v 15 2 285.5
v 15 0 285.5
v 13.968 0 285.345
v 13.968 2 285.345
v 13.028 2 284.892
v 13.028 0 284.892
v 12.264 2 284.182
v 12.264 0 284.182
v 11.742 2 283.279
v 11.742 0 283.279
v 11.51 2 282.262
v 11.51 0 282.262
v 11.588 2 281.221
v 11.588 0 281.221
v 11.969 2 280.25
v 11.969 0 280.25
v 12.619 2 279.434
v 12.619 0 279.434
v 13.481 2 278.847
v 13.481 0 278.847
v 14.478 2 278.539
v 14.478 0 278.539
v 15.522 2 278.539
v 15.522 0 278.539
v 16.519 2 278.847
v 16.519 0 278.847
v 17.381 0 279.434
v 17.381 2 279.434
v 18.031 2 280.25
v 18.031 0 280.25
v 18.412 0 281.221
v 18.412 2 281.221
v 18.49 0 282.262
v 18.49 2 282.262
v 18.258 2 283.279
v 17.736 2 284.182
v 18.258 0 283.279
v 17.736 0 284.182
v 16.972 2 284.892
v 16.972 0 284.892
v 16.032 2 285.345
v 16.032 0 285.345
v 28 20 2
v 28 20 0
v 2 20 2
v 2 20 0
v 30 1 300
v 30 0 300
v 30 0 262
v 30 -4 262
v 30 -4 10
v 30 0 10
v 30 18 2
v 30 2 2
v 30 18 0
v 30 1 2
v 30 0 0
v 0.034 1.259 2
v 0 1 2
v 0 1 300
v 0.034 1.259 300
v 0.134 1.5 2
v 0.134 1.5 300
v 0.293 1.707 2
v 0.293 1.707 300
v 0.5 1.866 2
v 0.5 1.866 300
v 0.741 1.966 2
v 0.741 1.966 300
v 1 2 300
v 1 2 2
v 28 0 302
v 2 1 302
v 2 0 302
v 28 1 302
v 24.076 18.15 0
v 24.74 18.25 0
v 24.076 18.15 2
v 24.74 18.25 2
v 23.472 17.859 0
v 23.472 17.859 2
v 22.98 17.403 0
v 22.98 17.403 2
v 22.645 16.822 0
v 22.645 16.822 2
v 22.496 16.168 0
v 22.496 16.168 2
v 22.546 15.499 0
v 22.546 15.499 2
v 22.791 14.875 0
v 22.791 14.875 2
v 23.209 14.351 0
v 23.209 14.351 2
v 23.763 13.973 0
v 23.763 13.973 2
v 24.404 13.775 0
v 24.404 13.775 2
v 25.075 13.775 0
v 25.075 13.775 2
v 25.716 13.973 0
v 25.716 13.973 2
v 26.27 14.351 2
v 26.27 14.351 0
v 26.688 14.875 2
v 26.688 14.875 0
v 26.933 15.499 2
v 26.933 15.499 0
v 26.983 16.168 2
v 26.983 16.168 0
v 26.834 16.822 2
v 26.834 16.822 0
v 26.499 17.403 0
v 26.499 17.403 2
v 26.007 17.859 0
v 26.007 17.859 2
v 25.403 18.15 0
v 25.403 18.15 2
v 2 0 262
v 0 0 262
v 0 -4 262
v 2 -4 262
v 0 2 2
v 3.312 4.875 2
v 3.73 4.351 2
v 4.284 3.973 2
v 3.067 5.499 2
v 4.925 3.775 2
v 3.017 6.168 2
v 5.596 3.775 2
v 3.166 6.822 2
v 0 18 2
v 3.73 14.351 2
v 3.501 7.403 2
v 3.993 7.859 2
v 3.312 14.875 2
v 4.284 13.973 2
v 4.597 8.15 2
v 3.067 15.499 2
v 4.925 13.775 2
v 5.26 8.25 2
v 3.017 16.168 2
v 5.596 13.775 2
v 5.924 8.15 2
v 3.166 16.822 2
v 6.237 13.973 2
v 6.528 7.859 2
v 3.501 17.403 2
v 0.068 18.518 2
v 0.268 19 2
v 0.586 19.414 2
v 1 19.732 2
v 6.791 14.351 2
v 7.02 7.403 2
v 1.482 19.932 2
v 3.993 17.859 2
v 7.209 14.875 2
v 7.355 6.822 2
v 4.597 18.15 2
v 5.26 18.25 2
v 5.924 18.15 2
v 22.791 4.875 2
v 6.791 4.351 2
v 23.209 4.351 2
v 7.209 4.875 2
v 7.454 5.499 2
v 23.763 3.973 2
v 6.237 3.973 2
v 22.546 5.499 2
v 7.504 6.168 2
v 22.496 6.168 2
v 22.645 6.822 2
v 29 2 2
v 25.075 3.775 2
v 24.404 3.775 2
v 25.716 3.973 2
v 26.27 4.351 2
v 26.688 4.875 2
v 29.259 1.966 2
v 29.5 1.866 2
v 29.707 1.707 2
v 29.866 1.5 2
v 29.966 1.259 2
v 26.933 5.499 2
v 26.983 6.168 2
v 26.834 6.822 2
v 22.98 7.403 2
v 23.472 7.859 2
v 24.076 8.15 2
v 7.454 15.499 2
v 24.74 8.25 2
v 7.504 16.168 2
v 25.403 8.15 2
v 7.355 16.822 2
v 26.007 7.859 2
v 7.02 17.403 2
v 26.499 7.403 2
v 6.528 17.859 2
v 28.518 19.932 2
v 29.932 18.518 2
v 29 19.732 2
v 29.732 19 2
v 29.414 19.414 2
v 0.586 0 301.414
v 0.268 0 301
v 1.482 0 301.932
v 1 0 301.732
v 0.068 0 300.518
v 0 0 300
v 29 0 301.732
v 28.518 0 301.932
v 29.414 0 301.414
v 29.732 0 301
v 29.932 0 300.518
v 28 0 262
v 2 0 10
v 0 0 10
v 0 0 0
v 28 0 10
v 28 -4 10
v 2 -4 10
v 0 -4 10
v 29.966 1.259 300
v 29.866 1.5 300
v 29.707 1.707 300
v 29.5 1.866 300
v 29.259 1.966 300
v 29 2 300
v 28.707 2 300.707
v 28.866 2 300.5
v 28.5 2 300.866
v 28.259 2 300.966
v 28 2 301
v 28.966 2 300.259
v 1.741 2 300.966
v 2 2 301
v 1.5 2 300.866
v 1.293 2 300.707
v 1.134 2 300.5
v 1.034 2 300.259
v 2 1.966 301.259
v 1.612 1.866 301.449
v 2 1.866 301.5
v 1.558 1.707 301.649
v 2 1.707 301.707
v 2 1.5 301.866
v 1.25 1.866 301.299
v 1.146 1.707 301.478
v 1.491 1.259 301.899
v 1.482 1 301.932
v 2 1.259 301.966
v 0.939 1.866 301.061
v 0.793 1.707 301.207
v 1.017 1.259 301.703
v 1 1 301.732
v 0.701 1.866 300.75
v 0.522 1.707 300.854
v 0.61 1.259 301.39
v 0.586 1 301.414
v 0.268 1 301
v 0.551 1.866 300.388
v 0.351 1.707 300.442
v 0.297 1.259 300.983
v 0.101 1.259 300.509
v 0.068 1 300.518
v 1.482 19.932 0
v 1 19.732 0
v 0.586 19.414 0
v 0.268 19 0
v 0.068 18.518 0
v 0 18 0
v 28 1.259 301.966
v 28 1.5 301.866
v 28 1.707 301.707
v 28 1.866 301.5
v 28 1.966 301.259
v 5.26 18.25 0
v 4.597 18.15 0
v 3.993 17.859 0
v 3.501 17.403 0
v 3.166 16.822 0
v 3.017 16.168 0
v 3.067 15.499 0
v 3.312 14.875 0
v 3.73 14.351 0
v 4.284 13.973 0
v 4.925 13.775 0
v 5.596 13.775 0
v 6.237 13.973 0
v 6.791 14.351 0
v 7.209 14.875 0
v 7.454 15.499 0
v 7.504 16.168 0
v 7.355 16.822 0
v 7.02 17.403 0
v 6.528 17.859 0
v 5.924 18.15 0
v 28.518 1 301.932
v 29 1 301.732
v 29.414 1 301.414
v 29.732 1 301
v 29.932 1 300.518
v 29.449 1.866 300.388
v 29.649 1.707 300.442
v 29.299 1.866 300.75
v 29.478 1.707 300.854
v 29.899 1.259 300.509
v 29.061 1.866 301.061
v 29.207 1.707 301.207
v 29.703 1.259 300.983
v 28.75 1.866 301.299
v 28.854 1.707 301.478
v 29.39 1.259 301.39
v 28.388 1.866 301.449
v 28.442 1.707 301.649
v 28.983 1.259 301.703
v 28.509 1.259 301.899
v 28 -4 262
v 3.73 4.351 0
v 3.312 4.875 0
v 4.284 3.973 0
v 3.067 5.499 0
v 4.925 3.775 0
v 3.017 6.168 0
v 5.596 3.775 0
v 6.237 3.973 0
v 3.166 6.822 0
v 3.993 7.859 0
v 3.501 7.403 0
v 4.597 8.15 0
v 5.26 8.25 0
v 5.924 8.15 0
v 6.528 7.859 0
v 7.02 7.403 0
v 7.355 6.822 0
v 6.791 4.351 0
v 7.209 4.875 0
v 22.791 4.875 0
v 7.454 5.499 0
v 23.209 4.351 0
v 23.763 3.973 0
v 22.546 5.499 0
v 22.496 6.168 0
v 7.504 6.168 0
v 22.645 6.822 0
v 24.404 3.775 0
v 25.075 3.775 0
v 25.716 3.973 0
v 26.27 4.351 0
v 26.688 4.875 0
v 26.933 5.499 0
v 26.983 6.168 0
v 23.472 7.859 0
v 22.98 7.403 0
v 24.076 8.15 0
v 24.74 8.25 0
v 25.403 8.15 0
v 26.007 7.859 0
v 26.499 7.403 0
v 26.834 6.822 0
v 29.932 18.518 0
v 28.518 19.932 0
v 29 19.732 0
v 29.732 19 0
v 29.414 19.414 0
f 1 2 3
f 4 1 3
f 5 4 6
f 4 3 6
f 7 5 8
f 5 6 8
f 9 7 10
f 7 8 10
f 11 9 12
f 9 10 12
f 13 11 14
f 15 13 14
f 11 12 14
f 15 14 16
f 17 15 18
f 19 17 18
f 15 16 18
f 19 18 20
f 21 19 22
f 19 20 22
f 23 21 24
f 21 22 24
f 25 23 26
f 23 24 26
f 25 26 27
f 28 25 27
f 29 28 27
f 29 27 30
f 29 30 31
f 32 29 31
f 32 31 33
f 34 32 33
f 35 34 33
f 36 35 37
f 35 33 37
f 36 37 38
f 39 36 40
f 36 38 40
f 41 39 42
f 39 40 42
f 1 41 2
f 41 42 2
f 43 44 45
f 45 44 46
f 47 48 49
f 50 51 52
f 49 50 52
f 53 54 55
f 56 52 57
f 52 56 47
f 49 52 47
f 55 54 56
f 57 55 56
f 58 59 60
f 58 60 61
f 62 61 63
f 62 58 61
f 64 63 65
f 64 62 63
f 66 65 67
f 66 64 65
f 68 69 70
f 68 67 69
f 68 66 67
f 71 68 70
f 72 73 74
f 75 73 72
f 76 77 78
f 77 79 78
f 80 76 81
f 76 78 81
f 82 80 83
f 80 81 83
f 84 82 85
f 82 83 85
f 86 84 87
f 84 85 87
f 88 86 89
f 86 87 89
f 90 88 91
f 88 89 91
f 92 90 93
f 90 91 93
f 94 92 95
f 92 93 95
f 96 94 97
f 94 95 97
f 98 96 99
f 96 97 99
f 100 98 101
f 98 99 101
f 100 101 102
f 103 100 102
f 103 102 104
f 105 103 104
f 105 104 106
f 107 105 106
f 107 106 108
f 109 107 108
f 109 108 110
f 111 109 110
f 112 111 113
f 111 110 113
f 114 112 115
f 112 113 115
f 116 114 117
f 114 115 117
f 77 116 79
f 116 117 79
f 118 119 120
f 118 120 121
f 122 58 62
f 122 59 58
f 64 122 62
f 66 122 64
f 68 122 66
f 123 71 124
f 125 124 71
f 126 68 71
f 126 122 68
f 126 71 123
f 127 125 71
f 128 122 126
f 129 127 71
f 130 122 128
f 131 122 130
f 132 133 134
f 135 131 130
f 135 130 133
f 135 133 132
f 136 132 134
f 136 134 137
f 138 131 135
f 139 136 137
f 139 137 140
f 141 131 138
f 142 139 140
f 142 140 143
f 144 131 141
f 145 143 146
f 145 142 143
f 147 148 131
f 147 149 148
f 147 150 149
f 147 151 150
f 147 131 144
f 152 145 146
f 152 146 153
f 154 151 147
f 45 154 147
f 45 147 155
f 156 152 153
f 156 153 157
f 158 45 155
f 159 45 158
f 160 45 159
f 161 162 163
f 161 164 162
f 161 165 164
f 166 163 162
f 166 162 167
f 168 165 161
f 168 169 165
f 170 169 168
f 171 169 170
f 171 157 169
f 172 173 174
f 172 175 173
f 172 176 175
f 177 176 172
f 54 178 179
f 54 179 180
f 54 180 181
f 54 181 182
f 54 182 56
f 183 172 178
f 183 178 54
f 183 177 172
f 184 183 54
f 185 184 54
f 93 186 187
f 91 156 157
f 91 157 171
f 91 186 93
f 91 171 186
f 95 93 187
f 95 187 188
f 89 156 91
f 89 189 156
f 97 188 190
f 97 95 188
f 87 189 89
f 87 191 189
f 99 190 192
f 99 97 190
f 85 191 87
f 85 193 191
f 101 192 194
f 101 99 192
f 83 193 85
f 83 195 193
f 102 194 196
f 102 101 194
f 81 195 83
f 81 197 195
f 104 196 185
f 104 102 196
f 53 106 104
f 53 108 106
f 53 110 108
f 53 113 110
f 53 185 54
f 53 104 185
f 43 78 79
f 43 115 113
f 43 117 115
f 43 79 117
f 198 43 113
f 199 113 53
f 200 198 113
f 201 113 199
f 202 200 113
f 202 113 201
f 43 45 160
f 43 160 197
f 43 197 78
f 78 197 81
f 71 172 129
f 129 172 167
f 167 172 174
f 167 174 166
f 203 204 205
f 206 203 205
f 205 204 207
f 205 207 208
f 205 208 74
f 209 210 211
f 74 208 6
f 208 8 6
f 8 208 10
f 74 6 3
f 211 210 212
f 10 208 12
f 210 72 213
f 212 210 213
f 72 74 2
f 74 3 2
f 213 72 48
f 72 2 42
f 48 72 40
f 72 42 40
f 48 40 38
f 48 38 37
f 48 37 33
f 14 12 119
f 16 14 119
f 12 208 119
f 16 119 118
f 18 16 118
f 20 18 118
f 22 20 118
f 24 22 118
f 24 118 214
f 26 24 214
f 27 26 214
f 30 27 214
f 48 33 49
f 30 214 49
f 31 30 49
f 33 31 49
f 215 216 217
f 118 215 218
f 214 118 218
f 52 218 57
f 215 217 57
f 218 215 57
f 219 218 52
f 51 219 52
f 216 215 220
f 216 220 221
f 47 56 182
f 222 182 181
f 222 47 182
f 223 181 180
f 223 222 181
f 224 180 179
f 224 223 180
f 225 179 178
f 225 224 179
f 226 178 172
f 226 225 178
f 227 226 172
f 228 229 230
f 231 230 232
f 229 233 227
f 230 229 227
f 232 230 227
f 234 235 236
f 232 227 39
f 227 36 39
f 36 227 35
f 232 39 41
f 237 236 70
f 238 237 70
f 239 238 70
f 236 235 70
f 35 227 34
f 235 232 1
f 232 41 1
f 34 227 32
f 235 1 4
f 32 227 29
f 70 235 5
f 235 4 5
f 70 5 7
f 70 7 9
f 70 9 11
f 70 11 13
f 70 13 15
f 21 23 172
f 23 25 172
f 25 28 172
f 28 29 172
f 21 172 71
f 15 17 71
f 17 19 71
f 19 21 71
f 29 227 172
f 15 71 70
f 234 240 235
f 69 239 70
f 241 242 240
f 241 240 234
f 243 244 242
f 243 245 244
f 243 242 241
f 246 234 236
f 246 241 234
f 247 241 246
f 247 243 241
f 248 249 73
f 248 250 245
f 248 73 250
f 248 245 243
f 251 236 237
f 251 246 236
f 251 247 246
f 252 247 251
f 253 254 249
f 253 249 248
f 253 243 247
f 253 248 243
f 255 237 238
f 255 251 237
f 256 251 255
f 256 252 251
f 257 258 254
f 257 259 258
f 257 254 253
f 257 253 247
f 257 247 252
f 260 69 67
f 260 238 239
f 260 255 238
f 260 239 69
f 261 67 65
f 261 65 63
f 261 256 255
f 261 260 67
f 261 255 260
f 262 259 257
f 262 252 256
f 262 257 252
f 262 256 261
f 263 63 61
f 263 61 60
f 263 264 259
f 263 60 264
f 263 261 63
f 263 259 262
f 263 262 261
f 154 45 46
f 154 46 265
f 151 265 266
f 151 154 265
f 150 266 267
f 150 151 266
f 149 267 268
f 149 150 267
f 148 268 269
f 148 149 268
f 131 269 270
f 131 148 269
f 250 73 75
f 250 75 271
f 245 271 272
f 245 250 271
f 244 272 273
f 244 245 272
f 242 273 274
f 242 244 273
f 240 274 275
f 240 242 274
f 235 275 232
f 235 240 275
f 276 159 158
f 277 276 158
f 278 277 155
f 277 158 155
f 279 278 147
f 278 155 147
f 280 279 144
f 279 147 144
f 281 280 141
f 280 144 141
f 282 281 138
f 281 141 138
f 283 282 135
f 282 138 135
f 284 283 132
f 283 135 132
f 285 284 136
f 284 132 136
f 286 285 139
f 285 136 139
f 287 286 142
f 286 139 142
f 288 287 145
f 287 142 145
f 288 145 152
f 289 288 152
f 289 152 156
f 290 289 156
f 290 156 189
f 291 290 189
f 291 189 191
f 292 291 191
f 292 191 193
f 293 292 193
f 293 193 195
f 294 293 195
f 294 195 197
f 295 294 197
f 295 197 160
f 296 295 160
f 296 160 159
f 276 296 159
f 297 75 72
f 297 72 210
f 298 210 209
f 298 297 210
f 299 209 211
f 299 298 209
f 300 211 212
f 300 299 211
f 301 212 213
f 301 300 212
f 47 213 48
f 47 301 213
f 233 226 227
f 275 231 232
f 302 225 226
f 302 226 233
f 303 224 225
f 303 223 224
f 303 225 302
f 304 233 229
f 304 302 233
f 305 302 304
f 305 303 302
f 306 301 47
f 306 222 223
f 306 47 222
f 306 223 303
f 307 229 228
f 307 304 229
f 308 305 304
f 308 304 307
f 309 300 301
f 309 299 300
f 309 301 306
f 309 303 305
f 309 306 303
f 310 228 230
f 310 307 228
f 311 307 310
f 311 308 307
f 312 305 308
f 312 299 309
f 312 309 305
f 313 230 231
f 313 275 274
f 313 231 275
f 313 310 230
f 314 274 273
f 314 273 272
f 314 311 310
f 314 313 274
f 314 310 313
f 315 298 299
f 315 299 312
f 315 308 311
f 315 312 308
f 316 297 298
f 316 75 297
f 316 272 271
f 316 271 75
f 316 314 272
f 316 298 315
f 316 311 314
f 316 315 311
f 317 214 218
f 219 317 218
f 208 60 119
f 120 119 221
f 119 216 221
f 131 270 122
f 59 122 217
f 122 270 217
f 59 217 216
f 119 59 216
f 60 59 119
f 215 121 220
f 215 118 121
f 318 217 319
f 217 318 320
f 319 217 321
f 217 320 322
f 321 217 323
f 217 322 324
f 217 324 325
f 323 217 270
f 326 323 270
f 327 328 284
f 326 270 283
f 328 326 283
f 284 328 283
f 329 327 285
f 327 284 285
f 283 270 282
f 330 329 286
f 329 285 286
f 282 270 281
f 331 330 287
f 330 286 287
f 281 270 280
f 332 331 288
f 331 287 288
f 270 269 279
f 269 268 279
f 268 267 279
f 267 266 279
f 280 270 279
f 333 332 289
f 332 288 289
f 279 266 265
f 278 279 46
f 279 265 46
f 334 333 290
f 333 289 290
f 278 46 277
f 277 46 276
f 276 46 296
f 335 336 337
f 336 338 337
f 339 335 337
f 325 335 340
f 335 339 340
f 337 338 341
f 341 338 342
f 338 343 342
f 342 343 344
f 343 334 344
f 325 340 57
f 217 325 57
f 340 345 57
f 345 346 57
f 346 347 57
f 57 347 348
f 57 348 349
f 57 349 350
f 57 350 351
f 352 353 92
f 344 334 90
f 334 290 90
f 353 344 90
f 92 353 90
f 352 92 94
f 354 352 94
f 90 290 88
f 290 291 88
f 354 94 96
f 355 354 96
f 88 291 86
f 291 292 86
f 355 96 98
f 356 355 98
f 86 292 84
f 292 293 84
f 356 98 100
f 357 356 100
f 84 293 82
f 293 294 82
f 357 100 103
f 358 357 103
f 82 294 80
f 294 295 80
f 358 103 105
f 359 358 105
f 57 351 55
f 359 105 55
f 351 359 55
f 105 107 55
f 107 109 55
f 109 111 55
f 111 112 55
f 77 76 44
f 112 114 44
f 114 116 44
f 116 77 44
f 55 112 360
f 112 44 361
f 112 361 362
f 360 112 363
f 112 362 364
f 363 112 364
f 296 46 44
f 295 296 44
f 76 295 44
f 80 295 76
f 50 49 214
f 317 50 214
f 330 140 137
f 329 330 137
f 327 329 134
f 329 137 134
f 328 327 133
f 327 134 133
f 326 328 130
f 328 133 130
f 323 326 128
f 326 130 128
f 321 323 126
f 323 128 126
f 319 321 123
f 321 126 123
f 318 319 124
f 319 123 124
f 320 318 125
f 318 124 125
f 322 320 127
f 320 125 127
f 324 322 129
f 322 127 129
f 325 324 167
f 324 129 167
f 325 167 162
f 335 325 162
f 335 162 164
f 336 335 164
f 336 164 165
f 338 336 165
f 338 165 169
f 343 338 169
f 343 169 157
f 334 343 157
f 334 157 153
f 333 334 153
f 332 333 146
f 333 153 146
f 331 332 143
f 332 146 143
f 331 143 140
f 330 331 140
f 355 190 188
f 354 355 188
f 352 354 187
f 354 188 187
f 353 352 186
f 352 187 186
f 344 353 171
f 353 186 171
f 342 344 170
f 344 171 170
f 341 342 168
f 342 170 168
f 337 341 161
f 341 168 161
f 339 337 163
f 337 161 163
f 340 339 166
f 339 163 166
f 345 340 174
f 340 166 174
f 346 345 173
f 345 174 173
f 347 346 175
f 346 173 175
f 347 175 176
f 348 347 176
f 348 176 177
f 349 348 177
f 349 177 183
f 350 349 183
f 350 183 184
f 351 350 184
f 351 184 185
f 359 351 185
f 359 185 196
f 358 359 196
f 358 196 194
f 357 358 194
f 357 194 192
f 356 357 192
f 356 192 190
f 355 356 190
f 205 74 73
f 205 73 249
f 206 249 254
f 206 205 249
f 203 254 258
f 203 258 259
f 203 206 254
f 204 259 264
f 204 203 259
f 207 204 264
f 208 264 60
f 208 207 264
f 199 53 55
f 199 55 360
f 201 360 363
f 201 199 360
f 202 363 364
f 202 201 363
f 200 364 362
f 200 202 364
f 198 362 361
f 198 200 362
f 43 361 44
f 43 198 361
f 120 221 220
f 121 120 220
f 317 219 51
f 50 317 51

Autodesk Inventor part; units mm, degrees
ref_plane "YZ Plane" through (0, 0, 0) normal (1, 0, 0) x (0, 1, 0)
ref_plane "XZ Plane" through (0, 0, 0) normal (0, 1, 0) x (-1, 0, 0)
ref_plane "XY Plane" through (0, 0, 0) normal (0, 0, 1) x (1, 0, 0)
sketch "スケッチ1" plane through (0, 0, 0) normal (0, 0, 1) x (1, 0, 0)
  line L0 (0, 0) -> (30, 0)
  line L1 (30, 0) -> (30, 20)
  line L2 (30, 20) -> (0, 20)
  line L3 (0, 20) -> (0, 0)
  dimension "d0" = 30
  dimension "d1" = 20
extrude "押し出し1" add sketch "スケッチ1" along normal blind 2
sketch "スケッチ2" plane through (0, 0, 2) normal (0, 0, 1) x (1, 0, 0)
  line L0 (0, 20) -> (0, 0) projected
  line L1 (0, 0) -> (30, 0)
  line L2 (30, 0) -> (30, 2)
  line L3 (30, 2) -> (0, 2)
  line L4 (0, 2) -> (0, 0)
  dimension "d4" = 2
extrude "押し出し2" add sketch "スケッチ2" along normal blind 300
fillet "フィレット1" radius 2 4 edges at (30, 20, 1) (0, 20, 1) (30, 1, 302) (0, 1, 302)
sketch "スケッチ3" plane through (0, 0, 0) normal (0, 0, -1) x (-1, 0, 0)
  line L0 (-28, 20) -> (-2, 20) projected
  line L1 (-15, 20) -> (-15, 0)
  line L2 (-2, 0) -> (-28, 0) projected
  point P0 (0, 0)
  point P1 (-24.7395, 16)
  point P2 (-5.2605, 16)
  point P3 (-24.7395, 6)
  point P4 (-5.2605, 6)
  dimension "d8" = 4
  dimension "d9" = 10
hole "穴1" at (24.7395, 16, 0) at (5.2605, 16, 0) at (24.7395, 6, 0) at (5.2605, 6, 0) direction (0, 0, 1) diameter 4.5 end through all
sketch "スケッチ4" plane through (0, 2, 2) normal (0, 1, 0) x (1, 0, 0)
  line L0 (2, -300) -> (28, -300) projected
  line L1 (15, -300) -> (15, 2) construction
  line L2 (28, 2) -> (2, 2) projected
  point P0 (0, 2)
  point P1 (15, -280)
  dimension "d17" = 20
hole "穴2" at (15, 2, 282) direction (0, -1, 0) diameter 7 end through all
sketch "スケッチ5" plane through (0, 2, 2) normal (0, 1, 0) x (1, 0, 0)
  line L0 (30, 0) -> (30, -298) projected
  line L1 (28, -8) -> (30, -8)
  line L2 (30, -8) -> (30, -260)
  line L3 (30, -260) -> (28, -260)
  line L4 (28, -260) -> (28, -8)
  line L5 (28, 2) -> (2, 2) projected
  line L6 (28, -300) -> (2, -300) projected
  line L7 (0, 0) -> (30, 0) projected
  line L8 (15, 0) -> (15, -300)
  line L9 (0, 0) -> (0, -298)
  line L10 (2, -8) -> (0, -8)
  line L11 (0, -8) -> (0, -260)
  line L12 (0, -260) -> (2, -260)
  line L13 (2, -260) -> (2, -8)
  point P0 (0, 2)
  dimension "d25" = 10
  dimension "d26" = 2
  dimension "d27" = 40
extrude "押し出し3" add sketch "スケッチ5" against normal blind 6
fillet "フィレット2" radius 1 4 edges at (29.4142, 2, 301.4142) (15, 2, 302) (0.5858, 2, 301.4142) (0, 2, 151)
properties part number "camera_stand" material "アルミニウム 6061"
